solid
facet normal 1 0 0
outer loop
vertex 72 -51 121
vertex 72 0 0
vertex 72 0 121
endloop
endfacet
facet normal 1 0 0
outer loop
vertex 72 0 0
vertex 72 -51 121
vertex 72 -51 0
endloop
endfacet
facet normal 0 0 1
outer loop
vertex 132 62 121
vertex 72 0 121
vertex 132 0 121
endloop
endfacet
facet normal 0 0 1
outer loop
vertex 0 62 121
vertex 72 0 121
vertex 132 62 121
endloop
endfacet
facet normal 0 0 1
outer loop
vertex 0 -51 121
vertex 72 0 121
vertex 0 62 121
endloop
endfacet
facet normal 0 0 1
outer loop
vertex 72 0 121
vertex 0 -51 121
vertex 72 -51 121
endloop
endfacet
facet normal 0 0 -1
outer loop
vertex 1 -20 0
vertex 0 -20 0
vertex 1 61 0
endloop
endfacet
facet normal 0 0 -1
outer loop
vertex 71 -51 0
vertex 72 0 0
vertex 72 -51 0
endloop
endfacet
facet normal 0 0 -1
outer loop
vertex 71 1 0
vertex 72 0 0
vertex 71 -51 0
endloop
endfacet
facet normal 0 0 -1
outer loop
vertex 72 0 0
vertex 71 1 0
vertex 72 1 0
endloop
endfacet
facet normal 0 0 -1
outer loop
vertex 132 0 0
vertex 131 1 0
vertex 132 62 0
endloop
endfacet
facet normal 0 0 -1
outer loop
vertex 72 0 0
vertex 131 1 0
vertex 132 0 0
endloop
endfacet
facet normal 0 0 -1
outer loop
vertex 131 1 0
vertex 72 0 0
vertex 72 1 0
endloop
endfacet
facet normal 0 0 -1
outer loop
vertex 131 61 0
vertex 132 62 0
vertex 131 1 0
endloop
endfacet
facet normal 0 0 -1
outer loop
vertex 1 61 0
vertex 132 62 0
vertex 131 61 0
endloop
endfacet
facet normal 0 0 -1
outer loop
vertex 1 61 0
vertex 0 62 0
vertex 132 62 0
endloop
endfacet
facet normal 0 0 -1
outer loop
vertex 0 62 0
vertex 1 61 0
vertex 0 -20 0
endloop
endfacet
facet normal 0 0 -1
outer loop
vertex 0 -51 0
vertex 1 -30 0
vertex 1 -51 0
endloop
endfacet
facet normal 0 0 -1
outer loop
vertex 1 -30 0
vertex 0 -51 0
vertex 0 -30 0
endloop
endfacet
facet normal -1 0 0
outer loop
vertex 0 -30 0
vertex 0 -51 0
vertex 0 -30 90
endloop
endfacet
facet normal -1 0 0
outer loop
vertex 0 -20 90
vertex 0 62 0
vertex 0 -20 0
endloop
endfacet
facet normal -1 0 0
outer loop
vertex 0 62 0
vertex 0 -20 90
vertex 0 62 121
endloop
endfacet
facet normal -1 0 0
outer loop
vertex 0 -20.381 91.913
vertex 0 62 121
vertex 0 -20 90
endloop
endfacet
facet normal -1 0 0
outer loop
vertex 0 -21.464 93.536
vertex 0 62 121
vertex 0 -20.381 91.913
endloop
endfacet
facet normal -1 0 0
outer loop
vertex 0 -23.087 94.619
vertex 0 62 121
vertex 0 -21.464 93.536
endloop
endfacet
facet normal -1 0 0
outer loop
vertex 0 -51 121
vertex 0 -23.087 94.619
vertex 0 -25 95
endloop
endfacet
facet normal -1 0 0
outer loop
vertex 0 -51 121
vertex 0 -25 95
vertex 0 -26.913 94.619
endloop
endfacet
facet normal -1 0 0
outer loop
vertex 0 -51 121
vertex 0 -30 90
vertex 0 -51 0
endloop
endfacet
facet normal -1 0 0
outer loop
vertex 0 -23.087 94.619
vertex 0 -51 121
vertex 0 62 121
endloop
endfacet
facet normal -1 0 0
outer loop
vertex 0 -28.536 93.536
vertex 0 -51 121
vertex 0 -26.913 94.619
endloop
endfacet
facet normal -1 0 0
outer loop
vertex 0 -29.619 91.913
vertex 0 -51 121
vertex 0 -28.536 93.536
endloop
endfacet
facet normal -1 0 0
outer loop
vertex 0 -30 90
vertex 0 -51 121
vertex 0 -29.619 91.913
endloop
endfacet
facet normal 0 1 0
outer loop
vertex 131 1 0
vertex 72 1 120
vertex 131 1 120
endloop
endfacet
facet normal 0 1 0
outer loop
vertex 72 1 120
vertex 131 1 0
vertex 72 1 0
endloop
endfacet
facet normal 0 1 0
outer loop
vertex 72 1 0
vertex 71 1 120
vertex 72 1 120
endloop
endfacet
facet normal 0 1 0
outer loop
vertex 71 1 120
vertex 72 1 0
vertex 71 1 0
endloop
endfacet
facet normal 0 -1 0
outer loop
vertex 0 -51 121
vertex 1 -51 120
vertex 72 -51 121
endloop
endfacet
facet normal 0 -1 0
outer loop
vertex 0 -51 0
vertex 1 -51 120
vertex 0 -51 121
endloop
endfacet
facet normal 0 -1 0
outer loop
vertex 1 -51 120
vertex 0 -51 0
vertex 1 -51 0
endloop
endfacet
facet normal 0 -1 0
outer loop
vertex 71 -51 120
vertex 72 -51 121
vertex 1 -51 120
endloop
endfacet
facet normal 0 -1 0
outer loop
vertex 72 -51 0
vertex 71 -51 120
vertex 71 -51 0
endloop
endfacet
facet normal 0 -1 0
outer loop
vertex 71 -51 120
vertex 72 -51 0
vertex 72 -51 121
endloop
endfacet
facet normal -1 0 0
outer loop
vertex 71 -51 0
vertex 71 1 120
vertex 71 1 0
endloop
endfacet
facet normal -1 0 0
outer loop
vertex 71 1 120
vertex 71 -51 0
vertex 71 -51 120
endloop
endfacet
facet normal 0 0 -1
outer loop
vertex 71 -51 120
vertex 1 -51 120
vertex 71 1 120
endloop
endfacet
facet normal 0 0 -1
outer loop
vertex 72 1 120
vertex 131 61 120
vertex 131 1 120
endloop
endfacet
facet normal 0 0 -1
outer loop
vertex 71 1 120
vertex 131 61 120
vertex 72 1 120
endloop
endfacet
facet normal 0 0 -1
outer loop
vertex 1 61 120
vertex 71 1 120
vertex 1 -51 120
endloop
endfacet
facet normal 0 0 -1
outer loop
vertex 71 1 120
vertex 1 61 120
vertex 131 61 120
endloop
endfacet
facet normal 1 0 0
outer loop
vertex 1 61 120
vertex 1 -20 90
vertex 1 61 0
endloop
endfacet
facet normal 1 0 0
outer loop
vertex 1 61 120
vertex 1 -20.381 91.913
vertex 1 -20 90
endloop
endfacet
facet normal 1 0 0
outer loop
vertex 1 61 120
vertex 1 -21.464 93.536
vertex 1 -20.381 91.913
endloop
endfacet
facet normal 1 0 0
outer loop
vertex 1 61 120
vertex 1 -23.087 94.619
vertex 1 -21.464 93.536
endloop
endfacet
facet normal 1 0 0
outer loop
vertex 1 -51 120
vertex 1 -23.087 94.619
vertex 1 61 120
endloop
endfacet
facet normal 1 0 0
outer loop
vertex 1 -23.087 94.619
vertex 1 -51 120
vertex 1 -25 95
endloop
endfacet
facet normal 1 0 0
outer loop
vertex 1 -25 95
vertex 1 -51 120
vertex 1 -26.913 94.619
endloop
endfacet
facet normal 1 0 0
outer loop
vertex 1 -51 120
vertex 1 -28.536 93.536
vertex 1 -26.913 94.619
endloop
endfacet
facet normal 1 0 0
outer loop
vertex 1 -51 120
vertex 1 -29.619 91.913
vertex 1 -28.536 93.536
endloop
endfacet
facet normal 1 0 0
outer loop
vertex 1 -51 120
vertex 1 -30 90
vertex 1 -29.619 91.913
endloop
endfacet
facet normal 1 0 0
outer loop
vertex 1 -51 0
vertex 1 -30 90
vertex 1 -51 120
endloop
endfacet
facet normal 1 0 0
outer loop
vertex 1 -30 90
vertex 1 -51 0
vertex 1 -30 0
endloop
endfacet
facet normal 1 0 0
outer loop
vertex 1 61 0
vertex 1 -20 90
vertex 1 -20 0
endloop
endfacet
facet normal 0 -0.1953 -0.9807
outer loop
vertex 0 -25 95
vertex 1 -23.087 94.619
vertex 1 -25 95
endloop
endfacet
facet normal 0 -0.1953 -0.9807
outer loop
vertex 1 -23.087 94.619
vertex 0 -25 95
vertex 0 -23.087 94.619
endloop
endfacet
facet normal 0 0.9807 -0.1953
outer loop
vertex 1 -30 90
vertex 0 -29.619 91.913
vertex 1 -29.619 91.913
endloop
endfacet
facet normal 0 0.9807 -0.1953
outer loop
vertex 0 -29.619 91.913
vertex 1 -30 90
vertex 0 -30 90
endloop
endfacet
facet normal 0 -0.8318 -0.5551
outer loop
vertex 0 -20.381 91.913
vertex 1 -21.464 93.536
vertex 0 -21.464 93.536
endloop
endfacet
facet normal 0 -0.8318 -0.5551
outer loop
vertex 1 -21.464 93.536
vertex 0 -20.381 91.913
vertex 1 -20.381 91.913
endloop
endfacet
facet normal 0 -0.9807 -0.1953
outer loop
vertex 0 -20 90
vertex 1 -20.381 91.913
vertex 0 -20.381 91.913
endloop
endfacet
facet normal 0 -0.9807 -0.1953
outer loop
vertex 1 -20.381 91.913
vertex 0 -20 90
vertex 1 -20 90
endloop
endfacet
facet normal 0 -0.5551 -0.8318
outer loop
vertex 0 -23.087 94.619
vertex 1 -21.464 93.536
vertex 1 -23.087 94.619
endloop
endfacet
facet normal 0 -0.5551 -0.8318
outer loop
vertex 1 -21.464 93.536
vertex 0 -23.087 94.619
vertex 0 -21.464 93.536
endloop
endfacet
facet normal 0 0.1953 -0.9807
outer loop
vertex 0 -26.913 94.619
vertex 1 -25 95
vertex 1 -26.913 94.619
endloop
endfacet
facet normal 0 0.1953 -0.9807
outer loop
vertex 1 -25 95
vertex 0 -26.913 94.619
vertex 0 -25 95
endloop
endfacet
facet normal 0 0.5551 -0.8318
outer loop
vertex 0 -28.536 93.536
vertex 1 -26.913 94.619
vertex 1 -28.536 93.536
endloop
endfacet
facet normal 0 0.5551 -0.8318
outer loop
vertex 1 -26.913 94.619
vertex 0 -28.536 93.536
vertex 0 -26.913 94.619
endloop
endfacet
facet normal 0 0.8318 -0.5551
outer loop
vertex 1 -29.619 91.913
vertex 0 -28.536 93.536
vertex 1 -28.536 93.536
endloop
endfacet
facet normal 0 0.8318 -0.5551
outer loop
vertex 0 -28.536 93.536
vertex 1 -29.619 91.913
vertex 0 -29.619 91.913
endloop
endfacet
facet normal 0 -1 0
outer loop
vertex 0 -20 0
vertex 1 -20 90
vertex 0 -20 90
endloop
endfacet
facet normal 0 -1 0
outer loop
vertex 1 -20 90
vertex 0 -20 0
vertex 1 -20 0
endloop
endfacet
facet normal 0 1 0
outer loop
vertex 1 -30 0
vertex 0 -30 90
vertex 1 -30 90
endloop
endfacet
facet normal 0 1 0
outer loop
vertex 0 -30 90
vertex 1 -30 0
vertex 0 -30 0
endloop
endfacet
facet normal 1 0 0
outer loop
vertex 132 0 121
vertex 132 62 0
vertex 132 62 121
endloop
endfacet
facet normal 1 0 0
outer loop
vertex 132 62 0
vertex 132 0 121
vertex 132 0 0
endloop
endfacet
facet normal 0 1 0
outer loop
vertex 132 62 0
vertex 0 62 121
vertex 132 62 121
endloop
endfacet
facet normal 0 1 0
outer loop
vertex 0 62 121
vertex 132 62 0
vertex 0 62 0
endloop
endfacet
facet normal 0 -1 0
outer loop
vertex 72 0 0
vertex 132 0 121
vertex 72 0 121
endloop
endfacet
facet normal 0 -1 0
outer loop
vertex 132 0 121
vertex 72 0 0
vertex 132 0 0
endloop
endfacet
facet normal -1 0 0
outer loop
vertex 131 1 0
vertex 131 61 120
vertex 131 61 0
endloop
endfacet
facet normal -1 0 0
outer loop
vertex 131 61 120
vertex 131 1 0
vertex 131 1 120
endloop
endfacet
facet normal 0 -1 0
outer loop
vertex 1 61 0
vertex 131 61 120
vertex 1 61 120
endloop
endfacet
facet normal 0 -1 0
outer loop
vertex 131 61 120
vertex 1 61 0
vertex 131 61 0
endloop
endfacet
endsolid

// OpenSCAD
//sof
// --------------------------------------------------------
// globals

// wall thickness
thickness = 1;

// total inner height
height = 120;


// --------------------------------------------------------
// main

result();
// zasuvka(thickness,height);
//diraNaSnuru(thickness, 10, 25, height);

// --------------------------------------------------------
// result

module result() {
    union() {
        translate([ 0, -50-thickness, 0]) {
            zasuvka(thickness,height);
        }
        krytka(thickness,height);
    }
}

// --------------------------------------------------------
// parts

module zasuvka(thickness,height) {
    depth = 50;
    d = 10;
    difference() {
        simpleBox(thickness, 70, depth, height, 0, 0);
        translate([-thickness, (depth-d)/2+thickness, 0]) {
            diraNaSnuru(thickness, d, 25, height);
        }
    }
}

module diraNaSnuru(thickness, diameter, delta, height) {
    depth = 4*thickness;
    radius = diameter/2;
    height = height - delta - radius;

    union() {
        translate([0,radius,height]) {
            rotate(a=[0,90,0]){
                cylinder(h=depth,r=radius);
            }
        }
        cube([depth, diameter, height]);
    }
}

module krytka(thickness,height) {
    difference() {
        simpleBox(thickness, 130, 60, height, 1, 1);
        translate([thickness, -thickness, -thickness]) {
            cube([70, 4*thickness, height+thickness]);
        }
    }
}

// --------------------------------------------------------
// simple modules

module simpleBox(thickness, innerX, innerY, innerZ, front, back) {
    outerX = innerX + 2*thickness;
    outerY = innerY + 2*thickness;
    outerZ = innerZ + thickness;
    innerHeight = innerZ + thickness;

    difference() {

        //outside box
        cube([outerX, outerY, outerZ]);

        //inside box
        translate([thickness, thickness, -thickness]) {
            cube([innerX, innerY, innerHeight]);
        }

        if( front == 0 ) {
            translate([thickness, -2*thickness, -thickness]) {
                cube([innerX, 4*thickness, innerHeight]);
            }
        }

        if( back == 0 ) {
            translate([thickness, outerY-2*thickness, -thickness]) {
                cube([innerX, 4*thickness, innerHeight]);
            }
        }

    }
}


// --------------------------------------------------------
// eof
